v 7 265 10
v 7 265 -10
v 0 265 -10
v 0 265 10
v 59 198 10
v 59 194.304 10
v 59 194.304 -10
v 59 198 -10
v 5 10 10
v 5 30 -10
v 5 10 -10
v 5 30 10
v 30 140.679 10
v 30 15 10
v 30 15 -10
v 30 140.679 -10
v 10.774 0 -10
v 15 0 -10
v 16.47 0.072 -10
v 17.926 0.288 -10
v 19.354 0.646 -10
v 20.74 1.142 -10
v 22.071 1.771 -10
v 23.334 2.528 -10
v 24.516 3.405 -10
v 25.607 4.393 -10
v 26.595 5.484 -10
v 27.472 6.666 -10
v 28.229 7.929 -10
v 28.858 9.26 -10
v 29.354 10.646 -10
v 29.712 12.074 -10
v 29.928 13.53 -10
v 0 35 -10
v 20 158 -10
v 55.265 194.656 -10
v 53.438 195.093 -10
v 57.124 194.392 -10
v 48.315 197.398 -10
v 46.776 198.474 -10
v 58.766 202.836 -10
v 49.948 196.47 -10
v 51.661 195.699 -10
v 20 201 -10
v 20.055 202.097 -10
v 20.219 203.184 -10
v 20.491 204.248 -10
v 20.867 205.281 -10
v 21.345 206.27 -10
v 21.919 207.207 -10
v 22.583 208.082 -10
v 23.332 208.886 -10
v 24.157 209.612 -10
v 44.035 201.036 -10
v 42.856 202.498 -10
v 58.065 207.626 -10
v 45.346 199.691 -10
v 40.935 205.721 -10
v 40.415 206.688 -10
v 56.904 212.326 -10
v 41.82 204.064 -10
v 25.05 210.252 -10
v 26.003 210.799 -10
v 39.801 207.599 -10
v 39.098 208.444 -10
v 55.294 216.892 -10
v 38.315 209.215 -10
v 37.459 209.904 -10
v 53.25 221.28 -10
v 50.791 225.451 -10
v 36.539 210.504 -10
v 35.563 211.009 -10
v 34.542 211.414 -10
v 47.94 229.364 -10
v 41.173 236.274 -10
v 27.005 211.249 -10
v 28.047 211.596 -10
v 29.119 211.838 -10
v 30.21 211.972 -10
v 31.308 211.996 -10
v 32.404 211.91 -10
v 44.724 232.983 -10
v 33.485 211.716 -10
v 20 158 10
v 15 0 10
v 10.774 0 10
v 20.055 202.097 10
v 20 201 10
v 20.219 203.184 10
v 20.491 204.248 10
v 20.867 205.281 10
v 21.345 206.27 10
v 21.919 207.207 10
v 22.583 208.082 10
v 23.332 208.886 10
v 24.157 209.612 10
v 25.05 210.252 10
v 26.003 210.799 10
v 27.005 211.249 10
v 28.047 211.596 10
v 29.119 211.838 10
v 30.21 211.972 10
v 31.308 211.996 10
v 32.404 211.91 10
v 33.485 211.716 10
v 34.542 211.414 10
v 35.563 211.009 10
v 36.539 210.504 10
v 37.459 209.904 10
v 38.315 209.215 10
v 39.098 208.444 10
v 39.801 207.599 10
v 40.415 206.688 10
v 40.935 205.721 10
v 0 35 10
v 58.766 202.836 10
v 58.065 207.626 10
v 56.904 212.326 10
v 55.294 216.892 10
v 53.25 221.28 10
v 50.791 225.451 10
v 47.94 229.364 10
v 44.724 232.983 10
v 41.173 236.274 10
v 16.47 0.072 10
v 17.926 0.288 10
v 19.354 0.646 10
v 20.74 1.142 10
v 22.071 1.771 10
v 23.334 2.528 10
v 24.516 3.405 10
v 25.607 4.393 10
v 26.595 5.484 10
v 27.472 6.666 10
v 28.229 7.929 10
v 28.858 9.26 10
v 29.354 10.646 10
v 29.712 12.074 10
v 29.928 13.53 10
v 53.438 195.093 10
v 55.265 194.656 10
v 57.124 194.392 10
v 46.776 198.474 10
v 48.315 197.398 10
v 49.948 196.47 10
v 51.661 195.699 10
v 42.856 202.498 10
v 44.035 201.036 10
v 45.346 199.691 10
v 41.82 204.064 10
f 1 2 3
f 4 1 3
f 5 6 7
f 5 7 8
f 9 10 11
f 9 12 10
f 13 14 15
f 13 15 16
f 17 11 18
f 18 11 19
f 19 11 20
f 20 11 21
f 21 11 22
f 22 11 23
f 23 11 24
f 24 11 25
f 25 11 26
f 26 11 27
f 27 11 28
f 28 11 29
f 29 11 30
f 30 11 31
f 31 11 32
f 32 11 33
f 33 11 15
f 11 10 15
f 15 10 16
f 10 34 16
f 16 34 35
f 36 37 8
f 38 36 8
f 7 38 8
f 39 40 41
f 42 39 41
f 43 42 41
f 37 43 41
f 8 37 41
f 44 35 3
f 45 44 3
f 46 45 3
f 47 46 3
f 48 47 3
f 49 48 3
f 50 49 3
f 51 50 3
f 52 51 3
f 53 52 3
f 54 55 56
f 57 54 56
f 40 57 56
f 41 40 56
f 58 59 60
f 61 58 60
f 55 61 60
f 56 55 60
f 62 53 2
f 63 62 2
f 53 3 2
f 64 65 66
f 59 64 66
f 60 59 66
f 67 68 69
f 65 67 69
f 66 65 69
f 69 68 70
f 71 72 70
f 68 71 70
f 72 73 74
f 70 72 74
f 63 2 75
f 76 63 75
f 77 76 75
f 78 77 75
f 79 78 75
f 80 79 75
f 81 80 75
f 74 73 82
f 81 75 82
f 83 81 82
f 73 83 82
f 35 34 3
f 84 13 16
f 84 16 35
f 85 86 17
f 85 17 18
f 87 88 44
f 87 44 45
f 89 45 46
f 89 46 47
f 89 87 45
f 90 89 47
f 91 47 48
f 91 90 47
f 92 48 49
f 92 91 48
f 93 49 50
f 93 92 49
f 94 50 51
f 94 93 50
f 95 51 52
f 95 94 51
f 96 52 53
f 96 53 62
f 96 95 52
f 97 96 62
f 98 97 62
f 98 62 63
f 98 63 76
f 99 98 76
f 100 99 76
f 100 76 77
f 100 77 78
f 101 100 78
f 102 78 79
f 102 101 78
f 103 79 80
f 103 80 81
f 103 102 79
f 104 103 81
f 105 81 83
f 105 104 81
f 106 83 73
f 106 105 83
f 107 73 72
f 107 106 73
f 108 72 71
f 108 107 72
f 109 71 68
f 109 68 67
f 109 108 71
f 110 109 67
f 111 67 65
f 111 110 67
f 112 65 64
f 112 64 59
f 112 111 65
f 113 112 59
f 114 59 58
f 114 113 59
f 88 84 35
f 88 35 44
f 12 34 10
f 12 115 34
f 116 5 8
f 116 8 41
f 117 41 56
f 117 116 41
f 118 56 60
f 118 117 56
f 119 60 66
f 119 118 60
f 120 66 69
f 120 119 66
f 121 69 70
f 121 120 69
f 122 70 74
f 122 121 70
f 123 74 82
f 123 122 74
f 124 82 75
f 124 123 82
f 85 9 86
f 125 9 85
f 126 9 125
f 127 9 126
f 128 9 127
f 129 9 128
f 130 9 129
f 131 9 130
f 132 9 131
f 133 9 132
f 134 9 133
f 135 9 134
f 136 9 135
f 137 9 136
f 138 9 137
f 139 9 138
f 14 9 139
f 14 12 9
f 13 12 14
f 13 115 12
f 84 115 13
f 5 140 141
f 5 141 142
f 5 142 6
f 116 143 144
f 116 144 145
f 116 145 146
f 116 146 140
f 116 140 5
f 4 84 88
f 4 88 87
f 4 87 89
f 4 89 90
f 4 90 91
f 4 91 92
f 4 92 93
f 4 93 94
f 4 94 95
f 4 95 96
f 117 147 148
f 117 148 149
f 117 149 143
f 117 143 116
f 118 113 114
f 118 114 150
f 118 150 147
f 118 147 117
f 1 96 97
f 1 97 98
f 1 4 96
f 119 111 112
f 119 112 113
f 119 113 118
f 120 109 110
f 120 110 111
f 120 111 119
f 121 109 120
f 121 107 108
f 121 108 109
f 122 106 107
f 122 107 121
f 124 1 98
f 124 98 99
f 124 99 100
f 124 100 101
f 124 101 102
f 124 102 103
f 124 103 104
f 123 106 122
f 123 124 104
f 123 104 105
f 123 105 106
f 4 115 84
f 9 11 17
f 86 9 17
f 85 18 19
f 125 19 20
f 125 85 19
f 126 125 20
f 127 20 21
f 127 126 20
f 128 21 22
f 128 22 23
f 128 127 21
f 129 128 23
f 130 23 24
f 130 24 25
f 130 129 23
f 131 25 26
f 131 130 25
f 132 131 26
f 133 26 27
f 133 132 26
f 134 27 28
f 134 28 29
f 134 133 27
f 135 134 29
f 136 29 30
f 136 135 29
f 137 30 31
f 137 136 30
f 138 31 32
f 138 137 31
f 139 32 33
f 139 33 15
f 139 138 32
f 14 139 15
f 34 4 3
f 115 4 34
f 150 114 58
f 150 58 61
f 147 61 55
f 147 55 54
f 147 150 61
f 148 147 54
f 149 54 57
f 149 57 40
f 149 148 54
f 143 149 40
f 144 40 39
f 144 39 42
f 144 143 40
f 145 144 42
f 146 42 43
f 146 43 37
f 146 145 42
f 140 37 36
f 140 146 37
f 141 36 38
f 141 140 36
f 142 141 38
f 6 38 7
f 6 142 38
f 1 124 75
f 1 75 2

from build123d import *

# Parameters (mm, degrees)
BOSS_EXTRUDE1_DEPTH = 10


with BuildPart() as part:
    # Sketch1 → Boss-Extrude1 (new, symmetric)
    with BuildSketch(Plane.XY):
        with BuildLine():
            Line((5, 10), (10.773502692, 0))
            Line((10.773502692, 0), (15, 0))
            ThreePointArc((15, 0), (25.606601718, 4.393398282), (30, 15))
            Line((30, 15), (30, 140.679491924))
            Line((30, 140.679491924), (20, 158))
            Line((20, 158), (20, 201))
            ThreePointArc((20, 201), (28.580322602, 211.73057134), (40.935483871, 205.720821989))
            ThreePointArc((40.935483871, 205.720821989), (48.315110065, 197.397534592), (59, 194.304134696))
            Line((59, 194.304134696), (59, 198))
            ThreePointArc((59, 198), (54.324714747, 219.11090318), (41.173190677, 236.273826587))
            Line((41.173190677, 236.273826587), (7, 265))
            Line((7, 265), (0, 265))
            Line((0, 265), (0, 35))
            Line((0, 35), (5, 30))
            Line((5, 30), (5, 10))
        make_face()
    extrude(amount=BOSS_EXTRUDE1_DEPTH, both=True)


solid = part.part
